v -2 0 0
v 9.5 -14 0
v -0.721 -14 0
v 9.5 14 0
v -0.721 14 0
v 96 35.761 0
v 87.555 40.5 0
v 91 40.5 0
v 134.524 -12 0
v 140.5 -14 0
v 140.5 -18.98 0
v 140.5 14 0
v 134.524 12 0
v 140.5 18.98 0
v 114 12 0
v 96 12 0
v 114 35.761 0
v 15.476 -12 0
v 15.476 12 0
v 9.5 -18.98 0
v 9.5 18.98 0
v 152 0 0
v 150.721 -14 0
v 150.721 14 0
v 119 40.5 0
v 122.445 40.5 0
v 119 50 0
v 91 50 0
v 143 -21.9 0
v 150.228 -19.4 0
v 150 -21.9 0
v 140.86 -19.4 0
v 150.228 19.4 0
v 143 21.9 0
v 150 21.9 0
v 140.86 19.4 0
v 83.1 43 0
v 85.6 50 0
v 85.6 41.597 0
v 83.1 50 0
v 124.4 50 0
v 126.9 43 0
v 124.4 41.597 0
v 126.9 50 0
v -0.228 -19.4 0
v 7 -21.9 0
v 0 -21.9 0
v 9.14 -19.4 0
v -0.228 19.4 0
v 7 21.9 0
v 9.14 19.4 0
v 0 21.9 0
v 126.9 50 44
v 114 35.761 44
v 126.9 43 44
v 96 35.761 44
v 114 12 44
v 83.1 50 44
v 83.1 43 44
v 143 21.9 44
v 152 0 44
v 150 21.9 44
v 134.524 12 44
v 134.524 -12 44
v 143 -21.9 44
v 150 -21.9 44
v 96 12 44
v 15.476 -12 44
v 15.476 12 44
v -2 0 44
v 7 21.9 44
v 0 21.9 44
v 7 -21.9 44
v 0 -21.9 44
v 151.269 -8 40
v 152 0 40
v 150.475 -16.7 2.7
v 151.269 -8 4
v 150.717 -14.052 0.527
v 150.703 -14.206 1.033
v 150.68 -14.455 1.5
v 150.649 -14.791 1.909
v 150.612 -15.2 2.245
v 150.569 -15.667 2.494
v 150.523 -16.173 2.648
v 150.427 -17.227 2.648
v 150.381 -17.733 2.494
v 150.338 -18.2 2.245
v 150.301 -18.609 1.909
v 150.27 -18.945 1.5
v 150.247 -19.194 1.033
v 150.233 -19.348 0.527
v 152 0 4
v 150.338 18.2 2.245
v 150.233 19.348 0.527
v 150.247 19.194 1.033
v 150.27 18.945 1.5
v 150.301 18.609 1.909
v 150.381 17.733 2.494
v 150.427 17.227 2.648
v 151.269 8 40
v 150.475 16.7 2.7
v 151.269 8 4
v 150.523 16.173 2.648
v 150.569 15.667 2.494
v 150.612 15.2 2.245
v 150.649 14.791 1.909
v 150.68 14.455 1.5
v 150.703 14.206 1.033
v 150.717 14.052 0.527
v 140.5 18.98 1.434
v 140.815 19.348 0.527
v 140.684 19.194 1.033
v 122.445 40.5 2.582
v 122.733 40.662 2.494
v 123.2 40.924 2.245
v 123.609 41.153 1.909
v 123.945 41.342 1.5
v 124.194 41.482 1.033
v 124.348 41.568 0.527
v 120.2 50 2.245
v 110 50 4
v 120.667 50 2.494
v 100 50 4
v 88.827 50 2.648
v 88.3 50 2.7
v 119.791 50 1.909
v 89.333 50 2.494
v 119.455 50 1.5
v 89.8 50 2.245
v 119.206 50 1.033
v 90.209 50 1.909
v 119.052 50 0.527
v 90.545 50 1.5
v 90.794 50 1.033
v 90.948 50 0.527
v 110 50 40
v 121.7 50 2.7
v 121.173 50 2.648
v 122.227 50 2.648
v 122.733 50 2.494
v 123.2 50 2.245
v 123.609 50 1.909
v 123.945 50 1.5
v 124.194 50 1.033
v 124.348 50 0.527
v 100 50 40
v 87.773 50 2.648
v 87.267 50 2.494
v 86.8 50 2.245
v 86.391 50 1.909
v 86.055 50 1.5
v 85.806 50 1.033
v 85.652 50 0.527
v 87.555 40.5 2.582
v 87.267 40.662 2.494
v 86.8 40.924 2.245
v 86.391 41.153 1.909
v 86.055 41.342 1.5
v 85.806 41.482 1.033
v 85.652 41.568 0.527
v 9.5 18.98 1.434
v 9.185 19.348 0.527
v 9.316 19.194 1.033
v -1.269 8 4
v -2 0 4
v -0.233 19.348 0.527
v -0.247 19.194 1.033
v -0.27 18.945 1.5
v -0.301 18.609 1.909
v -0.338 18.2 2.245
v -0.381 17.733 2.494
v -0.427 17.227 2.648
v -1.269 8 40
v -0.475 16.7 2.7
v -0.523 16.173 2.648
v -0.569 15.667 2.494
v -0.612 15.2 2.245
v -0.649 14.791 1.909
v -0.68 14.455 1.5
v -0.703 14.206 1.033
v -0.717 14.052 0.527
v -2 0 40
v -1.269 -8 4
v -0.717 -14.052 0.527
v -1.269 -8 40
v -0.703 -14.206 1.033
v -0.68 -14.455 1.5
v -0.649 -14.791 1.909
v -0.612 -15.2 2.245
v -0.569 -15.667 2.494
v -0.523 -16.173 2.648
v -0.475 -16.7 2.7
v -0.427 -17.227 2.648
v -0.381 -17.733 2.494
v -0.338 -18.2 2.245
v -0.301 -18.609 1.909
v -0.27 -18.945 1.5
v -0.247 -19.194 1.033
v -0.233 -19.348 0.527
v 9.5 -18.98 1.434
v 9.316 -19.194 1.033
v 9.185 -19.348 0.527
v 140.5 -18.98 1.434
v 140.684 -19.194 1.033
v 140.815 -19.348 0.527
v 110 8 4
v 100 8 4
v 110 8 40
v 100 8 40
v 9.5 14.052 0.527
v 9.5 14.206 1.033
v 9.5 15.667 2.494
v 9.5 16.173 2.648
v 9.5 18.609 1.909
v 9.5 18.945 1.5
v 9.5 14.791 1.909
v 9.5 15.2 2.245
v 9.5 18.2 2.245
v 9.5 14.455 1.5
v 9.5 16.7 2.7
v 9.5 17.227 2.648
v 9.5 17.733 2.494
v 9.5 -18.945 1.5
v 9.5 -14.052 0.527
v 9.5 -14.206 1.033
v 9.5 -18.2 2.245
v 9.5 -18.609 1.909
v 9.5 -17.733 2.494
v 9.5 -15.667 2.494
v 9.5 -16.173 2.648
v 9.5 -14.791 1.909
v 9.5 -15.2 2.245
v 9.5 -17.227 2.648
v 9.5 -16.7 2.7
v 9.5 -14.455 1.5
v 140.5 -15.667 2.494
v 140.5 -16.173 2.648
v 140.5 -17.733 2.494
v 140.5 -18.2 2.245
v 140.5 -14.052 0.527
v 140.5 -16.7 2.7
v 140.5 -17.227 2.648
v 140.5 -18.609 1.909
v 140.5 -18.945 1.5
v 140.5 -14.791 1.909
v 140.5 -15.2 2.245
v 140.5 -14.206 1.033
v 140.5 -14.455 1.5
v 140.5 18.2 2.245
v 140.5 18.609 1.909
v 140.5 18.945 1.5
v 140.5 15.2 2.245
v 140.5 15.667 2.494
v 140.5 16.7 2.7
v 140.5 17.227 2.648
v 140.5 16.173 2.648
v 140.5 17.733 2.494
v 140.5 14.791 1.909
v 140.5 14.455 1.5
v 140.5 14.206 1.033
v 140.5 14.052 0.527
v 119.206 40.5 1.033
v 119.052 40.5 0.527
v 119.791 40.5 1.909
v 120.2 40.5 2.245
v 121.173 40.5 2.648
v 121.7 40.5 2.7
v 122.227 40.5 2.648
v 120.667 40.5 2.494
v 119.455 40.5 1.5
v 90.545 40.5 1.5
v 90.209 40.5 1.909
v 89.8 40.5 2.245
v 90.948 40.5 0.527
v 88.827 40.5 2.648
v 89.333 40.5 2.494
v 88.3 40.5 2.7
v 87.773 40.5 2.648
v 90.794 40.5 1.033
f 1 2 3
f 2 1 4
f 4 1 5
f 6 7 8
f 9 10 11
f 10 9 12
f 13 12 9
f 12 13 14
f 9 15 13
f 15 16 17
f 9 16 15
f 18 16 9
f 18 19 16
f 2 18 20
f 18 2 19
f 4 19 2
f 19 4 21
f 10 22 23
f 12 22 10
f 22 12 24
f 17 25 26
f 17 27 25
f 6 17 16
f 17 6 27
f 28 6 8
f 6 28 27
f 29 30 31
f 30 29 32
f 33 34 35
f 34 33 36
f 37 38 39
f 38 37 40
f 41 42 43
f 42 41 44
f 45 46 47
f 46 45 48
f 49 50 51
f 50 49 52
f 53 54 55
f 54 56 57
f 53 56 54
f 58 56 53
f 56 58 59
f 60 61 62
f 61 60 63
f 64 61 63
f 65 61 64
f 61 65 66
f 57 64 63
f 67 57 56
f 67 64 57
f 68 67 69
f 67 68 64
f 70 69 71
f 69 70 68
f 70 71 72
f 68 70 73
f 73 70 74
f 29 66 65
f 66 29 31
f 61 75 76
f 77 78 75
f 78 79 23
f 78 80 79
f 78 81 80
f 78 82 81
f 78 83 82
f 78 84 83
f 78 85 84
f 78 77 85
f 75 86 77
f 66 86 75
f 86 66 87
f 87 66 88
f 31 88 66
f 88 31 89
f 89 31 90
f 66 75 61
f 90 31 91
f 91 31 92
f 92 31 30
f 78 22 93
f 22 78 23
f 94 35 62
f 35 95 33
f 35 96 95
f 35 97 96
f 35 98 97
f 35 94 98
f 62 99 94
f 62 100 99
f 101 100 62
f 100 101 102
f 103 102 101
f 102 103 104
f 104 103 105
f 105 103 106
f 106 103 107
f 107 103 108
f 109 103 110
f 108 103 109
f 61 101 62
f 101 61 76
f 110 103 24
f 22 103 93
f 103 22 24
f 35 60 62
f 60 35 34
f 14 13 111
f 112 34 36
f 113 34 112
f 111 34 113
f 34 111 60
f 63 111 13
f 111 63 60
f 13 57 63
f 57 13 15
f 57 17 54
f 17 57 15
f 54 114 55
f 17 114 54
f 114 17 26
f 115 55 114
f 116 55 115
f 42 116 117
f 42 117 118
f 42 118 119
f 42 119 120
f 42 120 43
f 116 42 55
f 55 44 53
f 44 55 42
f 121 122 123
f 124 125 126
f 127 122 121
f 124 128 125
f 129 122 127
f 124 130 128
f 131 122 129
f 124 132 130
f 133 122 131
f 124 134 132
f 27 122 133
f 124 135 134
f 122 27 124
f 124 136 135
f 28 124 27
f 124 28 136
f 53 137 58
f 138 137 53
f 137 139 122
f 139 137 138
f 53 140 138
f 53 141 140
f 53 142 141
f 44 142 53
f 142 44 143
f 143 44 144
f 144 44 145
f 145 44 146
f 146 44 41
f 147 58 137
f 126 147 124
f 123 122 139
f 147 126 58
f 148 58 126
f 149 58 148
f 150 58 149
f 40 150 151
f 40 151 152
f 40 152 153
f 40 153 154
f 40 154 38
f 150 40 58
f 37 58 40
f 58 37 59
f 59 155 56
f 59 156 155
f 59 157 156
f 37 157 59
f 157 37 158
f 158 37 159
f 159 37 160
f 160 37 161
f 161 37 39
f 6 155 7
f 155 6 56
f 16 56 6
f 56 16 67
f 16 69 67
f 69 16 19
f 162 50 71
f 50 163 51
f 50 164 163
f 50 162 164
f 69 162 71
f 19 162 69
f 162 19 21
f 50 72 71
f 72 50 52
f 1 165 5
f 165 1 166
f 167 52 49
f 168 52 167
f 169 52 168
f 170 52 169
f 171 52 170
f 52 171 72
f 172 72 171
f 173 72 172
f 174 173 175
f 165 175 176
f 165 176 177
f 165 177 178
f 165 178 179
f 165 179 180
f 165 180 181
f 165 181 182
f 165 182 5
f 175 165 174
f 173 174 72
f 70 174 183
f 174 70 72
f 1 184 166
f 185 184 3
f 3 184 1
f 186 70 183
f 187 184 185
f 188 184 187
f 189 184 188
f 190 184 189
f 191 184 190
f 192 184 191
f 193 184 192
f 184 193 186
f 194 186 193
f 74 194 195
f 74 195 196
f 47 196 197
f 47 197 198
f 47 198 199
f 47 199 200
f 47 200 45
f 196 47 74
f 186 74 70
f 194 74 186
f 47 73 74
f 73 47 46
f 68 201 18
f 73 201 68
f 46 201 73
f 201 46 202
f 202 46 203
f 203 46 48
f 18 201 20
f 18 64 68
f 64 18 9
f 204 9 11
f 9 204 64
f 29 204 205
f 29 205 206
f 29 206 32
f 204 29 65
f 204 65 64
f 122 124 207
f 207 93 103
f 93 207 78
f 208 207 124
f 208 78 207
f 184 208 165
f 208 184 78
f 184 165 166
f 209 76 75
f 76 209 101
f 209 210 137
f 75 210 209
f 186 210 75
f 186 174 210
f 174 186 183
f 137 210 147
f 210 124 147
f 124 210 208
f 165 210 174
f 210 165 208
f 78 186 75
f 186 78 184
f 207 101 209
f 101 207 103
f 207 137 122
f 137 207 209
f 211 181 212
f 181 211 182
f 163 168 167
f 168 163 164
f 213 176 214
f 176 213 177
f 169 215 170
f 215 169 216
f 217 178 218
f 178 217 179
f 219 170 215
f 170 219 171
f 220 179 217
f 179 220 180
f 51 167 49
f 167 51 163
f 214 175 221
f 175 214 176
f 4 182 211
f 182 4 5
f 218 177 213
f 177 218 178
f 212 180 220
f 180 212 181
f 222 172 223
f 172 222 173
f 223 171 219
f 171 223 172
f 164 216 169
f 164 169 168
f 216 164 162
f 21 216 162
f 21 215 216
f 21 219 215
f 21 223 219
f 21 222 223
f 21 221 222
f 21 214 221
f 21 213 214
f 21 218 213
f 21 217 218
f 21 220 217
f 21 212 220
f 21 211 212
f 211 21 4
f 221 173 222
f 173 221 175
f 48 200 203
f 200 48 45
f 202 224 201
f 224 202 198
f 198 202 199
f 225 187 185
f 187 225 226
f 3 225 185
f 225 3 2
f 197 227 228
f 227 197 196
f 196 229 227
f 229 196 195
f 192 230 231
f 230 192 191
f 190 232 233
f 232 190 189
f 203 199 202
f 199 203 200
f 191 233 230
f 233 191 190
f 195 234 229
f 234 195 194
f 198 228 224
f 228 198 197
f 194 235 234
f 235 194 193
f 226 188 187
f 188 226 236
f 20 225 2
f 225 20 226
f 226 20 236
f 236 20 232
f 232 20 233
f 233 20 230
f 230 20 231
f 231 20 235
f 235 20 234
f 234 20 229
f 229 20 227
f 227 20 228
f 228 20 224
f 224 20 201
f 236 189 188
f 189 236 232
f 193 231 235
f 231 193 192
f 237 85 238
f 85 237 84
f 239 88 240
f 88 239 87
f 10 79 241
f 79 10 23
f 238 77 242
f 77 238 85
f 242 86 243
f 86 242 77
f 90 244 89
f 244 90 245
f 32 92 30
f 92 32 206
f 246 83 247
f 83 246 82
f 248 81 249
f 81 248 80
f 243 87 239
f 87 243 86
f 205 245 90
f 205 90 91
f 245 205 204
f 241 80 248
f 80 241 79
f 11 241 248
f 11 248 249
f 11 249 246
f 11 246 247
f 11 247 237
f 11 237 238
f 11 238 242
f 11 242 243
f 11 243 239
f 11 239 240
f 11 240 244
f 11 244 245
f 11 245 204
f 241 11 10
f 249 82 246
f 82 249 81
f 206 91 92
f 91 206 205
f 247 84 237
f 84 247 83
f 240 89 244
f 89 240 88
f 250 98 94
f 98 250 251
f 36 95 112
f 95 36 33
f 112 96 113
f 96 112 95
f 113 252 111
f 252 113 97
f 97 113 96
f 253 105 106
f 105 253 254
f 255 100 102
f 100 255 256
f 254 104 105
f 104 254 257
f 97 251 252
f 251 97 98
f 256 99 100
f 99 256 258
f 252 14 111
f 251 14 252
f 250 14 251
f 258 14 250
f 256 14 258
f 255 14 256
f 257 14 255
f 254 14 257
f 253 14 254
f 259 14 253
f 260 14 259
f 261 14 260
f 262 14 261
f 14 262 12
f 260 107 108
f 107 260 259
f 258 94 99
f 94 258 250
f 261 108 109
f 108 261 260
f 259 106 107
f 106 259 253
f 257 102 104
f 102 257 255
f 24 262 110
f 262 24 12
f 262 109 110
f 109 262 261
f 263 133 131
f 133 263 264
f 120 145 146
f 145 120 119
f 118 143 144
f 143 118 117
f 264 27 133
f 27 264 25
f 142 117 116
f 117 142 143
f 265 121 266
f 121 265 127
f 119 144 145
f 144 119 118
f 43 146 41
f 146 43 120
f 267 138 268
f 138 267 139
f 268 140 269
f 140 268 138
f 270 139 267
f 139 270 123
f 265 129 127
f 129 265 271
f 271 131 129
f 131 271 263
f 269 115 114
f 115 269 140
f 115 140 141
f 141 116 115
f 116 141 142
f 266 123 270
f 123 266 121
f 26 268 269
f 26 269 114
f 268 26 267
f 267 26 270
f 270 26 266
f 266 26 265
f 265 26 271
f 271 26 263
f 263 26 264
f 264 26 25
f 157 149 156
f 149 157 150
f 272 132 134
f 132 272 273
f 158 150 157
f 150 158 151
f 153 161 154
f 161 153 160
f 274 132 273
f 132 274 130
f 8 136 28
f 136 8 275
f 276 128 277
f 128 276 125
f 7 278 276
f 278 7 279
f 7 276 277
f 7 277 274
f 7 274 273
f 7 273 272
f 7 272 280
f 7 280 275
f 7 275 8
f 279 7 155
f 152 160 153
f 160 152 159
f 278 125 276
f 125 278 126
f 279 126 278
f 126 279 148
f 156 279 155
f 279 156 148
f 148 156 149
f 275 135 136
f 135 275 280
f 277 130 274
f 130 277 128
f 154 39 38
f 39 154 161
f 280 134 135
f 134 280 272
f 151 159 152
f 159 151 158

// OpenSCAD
$fn = 32;

// ----------------------------------------------------------------------
// Air duct: 24 mm duct, 4 mm wall, 44 mm across
// ----------------------------------------------------------------------

// --- parameters (mm) ---
duct_r = 12;              // duct core radius
duct_d = 24;              // duct core diameter
wall = 4;                 // duct wall thickness
height = 44;              // duct width (extrusion height)
port_r = 21.9;            // port flange half width
port_d = 43.8;            // port flange width
port_t = 7;               // port flange thickness
bolt_d = 5.4;             // port bolt holes
bolt_offset = 16.7;       // bolt hole offset from the port axis
branch_r = 9;             // branch core radius
branch_d = 18;            // branch core diameter
branch_len = 50;          // branch length from the run axis

difference() {
  /* outer hull chain: tube with a flat flange plate at every port */
  linear_extrude(height = 44) {
    hull() {
      polygon([[0, -21.9], [0, 21.9], [7, 21.9], [7, -21.9]]);
      translate([10, 0]) circle(r = 12);
    }
    hull() {
      translate([10, 0]) circle(r = 12);
      translate([45, 0]) circle(r = 12);
    }
    hull() {
      translate([45, 0]) circle(r = 12);
      translate([105, 0]) circle(r = 12);
    }
    hull() {
      translate([105, 0]) circle(r = 12);
      translate([140, 0]) circle(r = 12);
    }
    hull() {
      translate([140, 0]) circle(r = 12);
      polygon([[150, 21.9], [150, -21.9], [143, -21.9], [143, 21.9]]);
    }
    hull() {
      translate([105, 0]) circle(r = 9);
      translate([105, 27.5]) circle(r = 9);
    }
    hull() {
      translate([105, 27.5]) circle(r = 9);
      translate([105, 41]) circle(r = 9);
    }
    hull() {
      translate([105, 41]) circle(r = 9);
      polygon([[83.1, 50], [126.9, 50], [126.9, 43], [83.1, 43]]);
    }
  }
  /* air passage: the same chain inset by the wall, 5 mm proud of the ports */
  translate([0, 0, 4]) linear_extrude(height = 36) {
    hull() {
      translate([-5, 0]) circle(r = 8);
      translate([45, 0]) circle(r = 8);
    }
    hull() {
      translate([45, 0]) circle(r = 8);
      translate([105, 0]) circle(r = 8);
    }
    hull() {
      translate([105, 0]) circle(r = 8);
      translate([155, 0]) circle(r = 8);
    }
    hull() {
      translate([105, 0]) circle(r = 5);
      translate([105, 27.5]) circle(r = 5);
    }
    hull() {
      translate([105, 27.5]) circle(r = 5);
      translate([105, 55]) circle(r = 5);
    }
  }
  translate([0, 0]) rotate([0, 0, -90]) translate([-16.7, -2.5]) rotate([-90, 0, 0]) cylinder(h = 12, d = 5.4);
  translate([0, 0]) rotate([0, 0, -90]) translate([16.7, -2.5]) rotate([-90, 0, 0]) cylinder(h = 12, d = 5.4);
  translate([150, 0]) rotate([0, 0, 90]) translate([-16.7, -2.5]) rotate([-90, 0, 0]) cylinder(h = 12, d = 5.4);
  translate([150, 0]) rotate([0, 0, 90]) translate([16.7, -2.5]) rotate([-90, 0, 0]) cylinder(h = 12, d = 5.4);
  translate([105, 50]) rotate([0, 0, 180]) translate([-16.7, -2.5]) rotate([-90, 0, 0]) cylinder(h = 12, d = 5.4);
  translate([105, 50]) rotate([0, 0, 180]) translate([16.7, -2.5]) rotate([-90, 0, 0]) cylinder(h = 12, d = 5.4);
}
